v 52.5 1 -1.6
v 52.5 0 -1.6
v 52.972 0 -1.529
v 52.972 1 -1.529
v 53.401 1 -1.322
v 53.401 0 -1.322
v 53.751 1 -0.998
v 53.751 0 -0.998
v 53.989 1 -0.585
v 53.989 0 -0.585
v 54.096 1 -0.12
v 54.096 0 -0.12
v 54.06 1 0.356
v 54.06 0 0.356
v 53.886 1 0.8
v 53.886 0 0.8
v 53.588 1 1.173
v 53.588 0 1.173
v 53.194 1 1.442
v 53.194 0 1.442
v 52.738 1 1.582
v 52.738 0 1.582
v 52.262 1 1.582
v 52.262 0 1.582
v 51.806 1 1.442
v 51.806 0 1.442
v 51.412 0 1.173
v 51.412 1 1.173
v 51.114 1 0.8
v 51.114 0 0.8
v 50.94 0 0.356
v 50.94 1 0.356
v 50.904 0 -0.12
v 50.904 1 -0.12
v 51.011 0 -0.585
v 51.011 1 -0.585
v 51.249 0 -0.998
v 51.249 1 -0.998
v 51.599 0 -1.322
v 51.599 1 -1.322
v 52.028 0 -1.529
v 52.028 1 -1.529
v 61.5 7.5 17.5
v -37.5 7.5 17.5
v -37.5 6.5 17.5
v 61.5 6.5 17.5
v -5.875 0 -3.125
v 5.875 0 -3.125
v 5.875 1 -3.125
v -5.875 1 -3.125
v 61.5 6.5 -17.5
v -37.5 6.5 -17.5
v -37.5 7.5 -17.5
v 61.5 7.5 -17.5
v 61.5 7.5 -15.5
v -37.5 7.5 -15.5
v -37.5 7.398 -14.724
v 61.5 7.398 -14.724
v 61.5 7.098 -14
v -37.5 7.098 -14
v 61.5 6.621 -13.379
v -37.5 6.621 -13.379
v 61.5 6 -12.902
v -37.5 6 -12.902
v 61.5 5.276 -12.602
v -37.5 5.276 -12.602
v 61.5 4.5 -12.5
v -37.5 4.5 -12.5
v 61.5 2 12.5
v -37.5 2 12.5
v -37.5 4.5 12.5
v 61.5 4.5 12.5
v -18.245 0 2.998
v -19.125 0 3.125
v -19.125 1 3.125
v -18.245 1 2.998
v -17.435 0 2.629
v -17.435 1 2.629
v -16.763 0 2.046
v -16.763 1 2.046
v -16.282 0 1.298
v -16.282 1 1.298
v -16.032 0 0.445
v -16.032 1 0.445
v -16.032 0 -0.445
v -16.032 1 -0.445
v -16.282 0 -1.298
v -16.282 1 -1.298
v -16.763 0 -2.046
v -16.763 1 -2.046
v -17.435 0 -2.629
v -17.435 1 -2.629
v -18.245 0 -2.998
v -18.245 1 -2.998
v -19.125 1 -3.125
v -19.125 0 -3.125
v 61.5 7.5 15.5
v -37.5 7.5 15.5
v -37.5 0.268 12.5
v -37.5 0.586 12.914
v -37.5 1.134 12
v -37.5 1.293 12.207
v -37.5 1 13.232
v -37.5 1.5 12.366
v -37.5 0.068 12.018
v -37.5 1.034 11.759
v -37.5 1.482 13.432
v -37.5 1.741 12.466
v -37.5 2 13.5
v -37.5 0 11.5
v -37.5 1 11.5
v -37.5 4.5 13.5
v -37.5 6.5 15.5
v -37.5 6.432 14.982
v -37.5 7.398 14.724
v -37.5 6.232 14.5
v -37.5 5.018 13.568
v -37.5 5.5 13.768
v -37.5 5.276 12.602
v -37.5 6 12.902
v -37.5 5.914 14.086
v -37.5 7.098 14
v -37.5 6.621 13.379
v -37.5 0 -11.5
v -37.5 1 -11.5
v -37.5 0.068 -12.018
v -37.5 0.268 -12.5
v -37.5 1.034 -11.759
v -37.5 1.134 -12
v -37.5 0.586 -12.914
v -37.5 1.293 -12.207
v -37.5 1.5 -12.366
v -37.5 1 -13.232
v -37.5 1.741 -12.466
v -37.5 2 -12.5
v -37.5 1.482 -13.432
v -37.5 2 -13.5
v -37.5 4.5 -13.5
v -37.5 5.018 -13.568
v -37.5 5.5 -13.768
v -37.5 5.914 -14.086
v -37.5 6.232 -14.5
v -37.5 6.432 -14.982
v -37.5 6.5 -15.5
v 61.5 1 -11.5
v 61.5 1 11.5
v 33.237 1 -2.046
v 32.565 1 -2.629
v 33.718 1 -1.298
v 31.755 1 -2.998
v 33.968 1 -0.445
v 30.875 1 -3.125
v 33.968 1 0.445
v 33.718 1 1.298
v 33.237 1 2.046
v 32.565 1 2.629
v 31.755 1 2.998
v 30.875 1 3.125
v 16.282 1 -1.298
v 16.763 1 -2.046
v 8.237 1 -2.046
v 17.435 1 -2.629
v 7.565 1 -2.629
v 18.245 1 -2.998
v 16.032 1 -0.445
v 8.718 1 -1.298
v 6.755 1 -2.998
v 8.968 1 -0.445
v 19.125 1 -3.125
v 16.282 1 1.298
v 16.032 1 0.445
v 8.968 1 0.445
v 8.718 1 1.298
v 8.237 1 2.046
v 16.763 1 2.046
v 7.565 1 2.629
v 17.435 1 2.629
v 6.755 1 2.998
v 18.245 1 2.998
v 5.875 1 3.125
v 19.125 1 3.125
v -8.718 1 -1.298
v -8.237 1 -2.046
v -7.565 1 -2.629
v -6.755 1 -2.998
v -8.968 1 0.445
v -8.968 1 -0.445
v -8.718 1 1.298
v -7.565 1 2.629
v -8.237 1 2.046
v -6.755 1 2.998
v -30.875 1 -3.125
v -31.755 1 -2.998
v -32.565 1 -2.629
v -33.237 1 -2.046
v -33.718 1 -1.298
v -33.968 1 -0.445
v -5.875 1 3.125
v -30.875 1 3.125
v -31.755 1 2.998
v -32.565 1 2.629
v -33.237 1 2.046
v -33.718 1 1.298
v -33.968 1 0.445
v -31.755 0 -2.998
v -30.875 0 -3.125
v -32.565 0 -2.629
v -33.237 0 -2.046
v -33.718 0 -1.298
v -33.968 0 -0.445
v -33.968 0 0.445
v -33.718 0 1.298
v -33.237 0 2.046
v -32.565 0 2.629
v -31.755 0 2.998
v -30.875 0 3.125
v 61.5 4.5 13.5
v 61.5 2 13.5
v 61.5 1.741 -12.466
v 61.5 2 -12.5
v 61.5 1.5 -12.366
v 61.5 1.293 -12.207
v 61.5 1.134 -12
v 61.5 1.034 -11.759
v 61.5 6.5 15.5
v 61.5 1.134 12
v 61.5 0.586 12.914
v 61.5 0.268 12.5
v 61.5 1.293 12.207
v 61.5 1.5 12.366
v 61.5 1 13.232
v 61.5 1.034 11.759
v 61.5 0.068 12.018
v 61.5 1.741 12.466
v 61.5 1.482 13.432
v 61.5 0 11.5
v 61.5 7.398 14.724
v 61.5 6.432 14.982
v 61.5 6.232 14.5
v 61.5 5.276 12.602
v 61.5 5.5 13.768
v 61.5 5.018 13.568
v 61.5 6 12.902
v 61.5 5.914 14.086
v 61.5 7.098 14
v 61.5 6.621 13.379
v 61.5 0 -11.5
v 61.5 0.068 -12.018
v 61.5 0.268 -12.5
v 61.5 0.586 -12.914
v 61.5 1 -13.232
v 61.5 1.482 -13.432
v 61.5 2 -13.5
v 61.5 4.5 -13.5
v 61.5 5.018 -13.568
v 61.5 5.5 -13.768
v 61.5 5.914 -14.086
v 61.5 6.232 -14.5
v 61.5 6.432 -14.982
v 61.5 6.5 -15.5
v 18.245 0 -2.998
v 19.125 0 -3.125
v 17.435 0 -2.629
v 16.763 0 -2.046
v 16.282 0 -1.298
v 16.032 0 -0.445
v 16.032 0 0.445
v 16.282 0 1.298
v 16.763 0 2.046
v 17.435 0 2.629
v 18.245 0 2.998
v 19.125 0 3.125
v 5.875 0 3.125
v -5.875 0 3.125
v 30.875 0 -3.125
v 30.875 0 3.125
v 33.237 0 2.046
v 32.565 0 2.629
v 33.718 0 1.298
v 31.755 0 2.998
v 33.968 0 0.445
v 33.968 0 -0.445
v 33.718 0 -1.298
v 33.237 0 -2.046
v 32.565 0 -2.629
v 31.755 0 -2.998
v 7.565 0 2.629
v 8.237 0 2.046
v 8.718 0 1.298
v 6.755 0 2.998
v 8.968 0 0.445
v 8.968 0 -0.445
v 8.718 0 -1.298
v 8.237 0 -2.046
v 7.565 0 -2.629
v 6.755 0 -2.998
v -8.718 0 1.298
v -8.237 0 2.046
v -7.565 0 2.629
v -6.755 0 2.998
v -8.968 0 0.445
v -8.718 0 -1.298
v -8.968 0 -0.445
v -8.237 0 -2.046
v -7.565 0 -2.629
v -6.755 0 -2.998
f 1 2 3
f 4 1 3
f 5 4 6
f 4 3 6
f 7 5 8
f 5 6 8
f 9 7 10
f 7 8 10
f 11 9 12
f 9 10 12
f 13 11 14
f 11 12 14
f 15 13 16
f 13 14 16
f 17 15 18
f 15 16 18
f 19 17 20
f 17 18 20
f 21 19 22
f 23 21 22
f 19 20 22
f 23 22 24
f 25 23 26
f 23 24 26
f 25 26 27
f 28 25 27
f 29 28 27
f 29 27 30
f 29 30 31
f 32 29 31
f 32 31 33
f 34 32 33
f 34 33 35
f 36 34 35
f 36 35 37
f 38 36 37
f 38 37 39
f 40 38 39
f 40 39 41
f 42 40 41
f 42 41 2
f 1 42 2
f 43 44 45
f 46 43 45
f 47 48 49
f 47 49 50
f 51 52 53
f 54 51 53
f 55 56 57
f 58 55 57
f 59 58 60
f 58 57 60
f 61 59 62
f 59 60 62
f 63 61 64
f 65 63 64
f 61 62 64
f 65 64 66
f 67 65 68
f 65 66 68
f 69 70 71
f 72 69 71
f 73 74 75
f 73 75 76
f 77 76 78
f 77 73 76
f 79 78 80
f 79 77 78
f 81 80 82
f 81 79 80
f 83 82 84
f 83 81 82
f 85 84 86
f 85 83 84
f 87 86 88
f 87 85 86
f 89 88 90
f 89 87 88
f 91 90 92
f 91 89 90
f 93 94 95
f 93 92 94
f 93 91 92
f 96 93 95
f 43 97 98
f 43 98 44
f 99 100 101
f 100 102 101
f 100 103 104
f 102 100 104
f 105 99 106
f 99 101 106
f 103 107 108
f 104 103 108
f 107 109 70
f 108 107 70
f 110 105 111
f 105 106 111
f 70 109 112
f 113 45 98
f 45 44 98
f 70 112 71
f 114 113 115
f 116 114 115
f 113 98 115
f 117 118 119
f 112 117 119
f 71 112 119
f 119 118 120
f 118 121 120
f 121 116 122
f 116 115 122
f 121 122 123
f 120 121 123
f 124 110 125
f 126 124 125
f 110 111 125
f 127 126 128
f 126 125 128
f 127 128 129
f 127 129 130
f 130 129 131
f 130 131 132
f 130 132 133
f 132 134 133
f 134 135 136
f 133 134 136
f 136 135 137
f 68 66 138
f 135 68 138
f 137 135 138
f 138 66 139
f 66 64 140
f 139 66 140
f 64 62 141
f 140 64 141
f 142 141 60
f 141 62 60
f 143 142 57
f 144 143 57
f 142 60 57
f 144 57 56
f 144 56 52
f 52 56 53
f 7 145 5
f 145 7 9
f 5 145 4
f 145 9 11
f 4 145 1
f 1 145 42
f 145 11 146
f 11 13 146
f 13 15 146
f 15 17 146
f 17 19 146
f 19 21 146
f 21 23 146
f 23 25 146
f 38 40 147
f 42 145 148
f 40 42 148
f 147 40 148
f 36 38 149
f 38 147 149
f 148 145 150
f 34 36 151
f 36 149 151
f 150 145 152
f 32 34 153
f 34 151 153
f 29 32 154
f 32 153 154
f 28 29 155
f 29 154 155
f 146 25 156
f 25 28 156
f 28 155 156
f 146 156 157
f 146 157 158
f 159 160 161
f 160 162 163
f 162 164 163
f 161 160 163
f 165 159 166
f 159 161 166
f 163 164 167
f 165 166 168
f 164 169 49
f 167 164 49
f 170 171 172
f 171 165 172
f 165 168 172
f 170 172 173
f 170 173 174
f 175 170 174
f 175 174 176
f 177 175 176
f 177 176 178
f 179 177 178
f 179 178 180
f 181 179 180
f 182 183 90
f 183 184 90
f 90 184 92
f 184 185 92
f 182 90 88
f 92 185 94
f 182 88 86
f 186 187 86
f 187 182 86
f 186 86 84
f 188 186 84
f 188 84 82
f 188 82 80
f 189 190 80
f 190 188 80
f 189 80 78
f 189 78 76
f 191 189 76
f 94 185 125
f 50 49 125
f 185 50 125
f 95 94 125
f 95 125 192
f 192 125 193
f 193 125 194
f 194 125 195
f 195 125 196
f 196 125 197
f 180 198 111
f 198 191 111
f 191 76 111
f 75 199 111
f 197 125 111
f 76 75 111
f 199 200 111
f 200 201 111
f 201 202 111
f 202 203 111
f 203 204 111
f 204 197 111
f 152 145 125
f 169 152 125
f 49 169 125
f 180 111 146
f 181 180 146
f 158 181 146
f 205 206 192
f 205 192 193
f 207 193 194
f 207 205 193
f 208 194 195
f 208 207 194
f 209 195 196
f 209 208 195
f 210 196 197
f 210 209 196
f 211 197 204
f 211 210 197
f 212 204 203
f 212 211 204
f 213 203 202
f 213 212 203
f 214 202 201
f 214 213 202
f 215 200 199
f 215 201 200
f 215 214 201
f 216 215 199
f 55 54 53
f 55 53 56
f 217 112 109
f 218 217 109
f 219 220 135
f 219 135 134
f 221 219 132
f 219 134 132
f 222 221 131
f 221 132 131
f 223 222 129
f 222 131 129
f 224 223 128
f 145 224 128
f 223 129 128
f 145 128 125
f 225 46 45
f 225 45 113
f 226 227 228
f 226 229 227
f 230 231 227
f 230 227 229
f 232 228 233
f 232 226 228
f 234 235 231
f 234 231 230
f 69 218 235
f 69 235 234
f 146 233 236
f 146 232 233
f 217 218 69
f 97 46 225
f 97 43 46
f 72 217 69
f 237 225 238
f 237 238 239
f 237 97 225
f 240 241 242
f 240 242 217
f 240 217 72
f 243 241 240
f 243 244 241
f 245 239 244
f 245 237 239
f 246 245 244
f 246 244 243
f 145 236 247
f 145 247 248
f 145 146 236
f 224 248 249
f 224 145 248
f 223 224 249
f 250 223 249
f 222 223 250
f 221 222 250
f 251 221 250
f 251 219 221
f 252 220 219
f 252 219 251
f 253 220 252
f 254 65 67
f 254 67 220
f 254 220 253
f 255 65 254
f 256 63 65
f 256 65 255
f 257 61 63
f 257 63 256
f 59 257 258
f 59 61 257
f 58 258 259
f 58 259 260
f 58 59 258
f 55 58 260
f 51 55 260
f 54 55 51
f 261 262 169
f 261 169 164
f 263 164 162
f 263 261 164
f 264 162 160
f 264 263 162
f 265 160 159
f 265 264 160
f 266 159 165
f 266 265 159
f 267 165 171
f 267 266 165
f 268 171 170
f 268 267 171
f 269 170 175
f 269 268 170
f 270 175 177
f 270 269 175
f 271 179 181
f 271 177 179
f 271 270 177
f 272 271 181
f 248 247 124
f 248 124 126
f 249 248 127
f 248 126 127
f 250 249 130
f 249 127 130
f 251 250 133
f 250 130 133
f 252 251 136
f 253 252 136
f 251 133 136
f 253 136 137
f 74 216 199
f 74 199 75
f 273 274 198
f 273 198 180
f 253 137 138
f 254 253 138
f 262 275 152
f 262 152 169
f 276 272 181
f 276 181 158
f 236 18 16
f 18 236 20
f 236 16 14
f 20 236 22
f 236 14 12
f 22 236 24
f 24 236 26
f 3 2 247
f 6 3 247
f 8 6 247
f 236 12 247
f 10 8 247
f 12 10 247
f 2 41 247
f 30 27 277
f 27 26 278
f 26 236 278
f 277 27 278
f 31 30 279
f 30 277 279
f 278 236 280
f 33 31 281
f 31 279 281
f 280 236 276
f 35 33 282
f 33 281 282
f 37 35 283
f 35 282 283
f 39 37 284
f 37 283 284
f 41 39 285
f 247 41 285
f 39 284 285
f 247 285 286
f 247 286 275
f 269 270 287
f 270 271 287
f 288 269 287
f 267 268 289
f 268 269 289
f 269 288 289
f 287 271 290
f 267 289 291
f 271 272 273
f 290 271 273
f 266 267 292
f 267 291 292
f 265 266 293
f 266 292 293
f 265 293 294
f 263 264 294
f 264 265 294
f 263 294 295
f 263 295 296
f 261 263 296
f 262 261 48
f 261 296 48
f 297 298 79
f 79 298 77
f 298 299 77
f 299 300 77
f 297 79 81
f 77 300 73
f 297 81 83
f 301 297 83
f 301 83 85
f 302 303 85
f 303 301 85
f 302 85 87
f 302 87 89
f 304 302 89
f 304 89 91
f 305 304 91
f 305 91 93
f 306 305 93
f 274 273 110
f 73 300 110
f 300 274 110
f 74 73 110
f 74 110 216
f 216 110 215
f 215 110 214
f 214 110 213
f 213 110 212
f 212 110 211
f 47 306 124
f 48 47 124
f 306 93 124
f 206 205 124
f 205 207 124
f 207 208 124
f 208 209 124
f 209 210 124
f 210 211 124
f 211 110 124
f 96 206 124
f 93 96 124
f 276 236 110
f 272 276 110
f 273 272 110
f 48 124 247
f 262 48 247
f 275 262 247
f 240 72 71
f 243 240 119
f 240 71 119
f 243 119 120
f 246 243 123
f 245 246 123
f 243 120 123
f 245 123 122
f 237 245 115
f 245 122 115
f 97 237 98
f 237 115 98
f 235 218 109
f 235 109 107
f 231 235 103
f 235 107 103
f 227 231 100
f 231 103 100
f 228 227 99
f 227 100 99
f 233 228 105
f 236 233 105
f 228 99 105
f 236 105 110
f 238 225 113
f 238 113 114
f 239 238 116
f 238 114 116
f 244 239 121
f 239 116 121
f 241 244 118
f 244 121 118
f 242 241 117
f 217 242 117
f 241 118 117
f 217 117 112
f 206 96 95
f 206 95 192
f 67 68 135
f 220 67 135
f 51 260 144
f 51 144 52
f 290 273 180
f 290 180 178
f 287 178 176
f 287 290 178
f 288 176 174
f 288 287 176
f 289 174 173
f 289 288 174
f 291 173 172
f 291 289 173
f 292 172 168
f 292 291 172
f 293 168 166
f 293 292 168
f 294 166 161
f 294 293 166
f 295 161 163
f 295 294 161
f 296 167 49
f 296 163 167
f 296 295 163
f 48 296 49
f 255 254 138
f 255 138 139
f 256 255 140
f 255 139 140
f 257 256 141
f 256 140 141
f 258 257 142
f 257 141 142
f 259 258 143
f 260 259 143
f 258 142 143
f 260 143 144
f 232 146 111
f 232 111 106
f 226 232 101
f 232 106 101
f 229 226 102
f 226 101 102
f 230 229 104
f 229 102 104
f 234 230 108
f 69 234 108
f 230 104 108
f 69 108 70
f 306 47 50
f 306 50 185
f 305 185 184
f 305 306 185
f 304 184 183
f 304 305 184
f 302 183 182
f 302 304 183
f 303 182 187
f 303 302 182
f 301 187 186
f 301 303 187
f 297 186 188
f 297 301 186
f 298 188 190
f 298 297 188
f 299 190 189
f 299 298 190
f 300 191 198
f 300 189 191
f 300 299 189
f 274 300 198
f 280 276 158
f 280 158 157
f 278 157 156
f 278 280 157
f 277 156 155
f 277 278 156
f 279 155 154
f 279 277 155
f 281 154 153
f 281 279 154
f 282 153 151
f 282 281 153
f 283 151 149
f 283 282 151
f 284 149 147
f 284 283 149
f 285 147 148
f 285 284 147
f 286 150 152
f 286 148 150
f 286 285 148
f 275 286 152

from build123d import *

# Parameters (mm, degrees)
EXTRUDE_THIN1_DEPTH        = 61.5
EXTRUDE_THIN1_DEPTH_BACK   = 37.5
CUT_EXTRUDE1_REACH         = 66.38
LPATTERN1_COUNT            = 2
LPATTERN1_PITCH            = 25
LPATTERN1_COL_COUNT        = 2
LPATTERN1_COL_PITCH        = 25
SZKIC1_R                   = 1.6
WYTNIJ_WYCI_GNI_CIE1_DEPTH = 65.379732836


with BuildPart() as part:
    # Sketch1 → Extrude-Thin1 (new, two sides: drawn at the far end of the back side and taken through both)
    with BuildSketch(Plane(origin=(0, 0, 0), x_dir=(0, 0, -1), z_dir=(1, 0, 0)).offset(-EXTRUDE_THIN1_DEPTH_BACK)):
        with BuildLine():
            Line((-17.5, 6.5), (-15.5, 6.5))
            ThreePointArc((-15.5, 6.5), (-14.085786438, 5.914213562), (-13.5, 4.5))
            Line((-13.5, 4.5), (-13.5, 2))
            ThreePointArc((-13.5, 2), (-12.914213562, 0.585786438), (-11.5, 0))
            Line((-11.5, 0), (11.5, 0))
            ThreePointArc((11.5, 0), (12.914213562, 0.585786438), (13.5, 2))
            Line((13.5, 2), (13.5, 4.5))
            ThreePointArc((13.5, 4.5), (14.085786438, 5.914213562), (15.5, 6.5))
            Line((15.5, 6.5), (17.5, 6.5))
            Line((17.5, 6.5), (17.5, 7.5))
            Line((17.5, 7.5), (15.5, 7.5))
            ThreePointArc((15.5, 7.5), (13.378679656, 6.621320344), (12.5, 4.5))
            Line((12.5, 4.5), (12.5, 2))
            ThreePointArc((12.5, 2), (12.207106781, 1.292893219), (11.5, 1))
            Line((11.5, 1), (-11.5, 1))
            ThreePointArc((-11.5, 1), (-12.207106781, 1.292893219), (-12.5, 2))
            Line((-12.5, 2), (-12.5, 4.5))
            ThreePointArc((-12.5, 4.5), (-13.378679656, 6.621320344), (-15.5, 7.5))
            Line((-15.5, 7.5), (-17.5, 7.5))
            Line((-17.5, 7.5), (-17.5, 6.5))
        make_face()
    extrude(amount=EXTRUDE_THIN1_DEPTH + EXTRUDE_THIN1_DEPTH_BACK)

    # Sketch2 → Cut-Extrude1 (cut, up to next)
    with BuildSketch(Plane.XZ, mode=Mode.PRIVATE) as cut_extrude1_sk1:
        with BuildLine():
            Line((-5.875, 3.125), (5.875, 3.125))
            ThreePointArc((5.875, 3.125), (9, 0), (5.875, -3.125))
            Line((5.875, -3.125), (-5.875, -3.125))
            ThreePointArc((-5.875, -3.125), (-9, 0), (-5.875, 3.125))
        make_face()
    cut_extrude1_tool1 = extrude(cut_extrude1_sk1.sketch, amount=-CUT_EXTRUDE1_REACH, mode=Mode.PRIVATE) & part.part
    cut_extrude1 = cut_extrude1_tool1.solids().sort_by_distance((0, 0, 0))[0]
    add(cut_extrude1, mode=Mode.SUBTRACT)

    # LPattern1: Cut-Extrude1 ×2
    with Locations(*[(i * LPATTERN1_PITCH, 0, 0) for i in range(1, LPATTERN1_COUNT)]):
        add(cut_extrude1, mode=Mode.SUBTRACT)

    # LPattern1 col: Cut-Extrude1 ×2
    with Locations(*[(-i * LPATTERN1_COL_PITCH, 0, 0) for i in range(1, LPATTERN1_COL_COUNT)]):
        add(cut_extrude1, mode=Mode.SUBTRACT)

    # Szkic1 → Wytnij-wyciągnięcie1 (cut, through all)
    with BuildSketch(Plane.XZ):
        with Locations(Location((52.5, 0, 0), (0, 0, 270))):
            Circle(SZKIC1_R)
    extrude(amount=-WYTNIJ_WYCI_GNI_CIE1_DEPTH, mode=Mode.SUBTRACT)


solid = part.part
